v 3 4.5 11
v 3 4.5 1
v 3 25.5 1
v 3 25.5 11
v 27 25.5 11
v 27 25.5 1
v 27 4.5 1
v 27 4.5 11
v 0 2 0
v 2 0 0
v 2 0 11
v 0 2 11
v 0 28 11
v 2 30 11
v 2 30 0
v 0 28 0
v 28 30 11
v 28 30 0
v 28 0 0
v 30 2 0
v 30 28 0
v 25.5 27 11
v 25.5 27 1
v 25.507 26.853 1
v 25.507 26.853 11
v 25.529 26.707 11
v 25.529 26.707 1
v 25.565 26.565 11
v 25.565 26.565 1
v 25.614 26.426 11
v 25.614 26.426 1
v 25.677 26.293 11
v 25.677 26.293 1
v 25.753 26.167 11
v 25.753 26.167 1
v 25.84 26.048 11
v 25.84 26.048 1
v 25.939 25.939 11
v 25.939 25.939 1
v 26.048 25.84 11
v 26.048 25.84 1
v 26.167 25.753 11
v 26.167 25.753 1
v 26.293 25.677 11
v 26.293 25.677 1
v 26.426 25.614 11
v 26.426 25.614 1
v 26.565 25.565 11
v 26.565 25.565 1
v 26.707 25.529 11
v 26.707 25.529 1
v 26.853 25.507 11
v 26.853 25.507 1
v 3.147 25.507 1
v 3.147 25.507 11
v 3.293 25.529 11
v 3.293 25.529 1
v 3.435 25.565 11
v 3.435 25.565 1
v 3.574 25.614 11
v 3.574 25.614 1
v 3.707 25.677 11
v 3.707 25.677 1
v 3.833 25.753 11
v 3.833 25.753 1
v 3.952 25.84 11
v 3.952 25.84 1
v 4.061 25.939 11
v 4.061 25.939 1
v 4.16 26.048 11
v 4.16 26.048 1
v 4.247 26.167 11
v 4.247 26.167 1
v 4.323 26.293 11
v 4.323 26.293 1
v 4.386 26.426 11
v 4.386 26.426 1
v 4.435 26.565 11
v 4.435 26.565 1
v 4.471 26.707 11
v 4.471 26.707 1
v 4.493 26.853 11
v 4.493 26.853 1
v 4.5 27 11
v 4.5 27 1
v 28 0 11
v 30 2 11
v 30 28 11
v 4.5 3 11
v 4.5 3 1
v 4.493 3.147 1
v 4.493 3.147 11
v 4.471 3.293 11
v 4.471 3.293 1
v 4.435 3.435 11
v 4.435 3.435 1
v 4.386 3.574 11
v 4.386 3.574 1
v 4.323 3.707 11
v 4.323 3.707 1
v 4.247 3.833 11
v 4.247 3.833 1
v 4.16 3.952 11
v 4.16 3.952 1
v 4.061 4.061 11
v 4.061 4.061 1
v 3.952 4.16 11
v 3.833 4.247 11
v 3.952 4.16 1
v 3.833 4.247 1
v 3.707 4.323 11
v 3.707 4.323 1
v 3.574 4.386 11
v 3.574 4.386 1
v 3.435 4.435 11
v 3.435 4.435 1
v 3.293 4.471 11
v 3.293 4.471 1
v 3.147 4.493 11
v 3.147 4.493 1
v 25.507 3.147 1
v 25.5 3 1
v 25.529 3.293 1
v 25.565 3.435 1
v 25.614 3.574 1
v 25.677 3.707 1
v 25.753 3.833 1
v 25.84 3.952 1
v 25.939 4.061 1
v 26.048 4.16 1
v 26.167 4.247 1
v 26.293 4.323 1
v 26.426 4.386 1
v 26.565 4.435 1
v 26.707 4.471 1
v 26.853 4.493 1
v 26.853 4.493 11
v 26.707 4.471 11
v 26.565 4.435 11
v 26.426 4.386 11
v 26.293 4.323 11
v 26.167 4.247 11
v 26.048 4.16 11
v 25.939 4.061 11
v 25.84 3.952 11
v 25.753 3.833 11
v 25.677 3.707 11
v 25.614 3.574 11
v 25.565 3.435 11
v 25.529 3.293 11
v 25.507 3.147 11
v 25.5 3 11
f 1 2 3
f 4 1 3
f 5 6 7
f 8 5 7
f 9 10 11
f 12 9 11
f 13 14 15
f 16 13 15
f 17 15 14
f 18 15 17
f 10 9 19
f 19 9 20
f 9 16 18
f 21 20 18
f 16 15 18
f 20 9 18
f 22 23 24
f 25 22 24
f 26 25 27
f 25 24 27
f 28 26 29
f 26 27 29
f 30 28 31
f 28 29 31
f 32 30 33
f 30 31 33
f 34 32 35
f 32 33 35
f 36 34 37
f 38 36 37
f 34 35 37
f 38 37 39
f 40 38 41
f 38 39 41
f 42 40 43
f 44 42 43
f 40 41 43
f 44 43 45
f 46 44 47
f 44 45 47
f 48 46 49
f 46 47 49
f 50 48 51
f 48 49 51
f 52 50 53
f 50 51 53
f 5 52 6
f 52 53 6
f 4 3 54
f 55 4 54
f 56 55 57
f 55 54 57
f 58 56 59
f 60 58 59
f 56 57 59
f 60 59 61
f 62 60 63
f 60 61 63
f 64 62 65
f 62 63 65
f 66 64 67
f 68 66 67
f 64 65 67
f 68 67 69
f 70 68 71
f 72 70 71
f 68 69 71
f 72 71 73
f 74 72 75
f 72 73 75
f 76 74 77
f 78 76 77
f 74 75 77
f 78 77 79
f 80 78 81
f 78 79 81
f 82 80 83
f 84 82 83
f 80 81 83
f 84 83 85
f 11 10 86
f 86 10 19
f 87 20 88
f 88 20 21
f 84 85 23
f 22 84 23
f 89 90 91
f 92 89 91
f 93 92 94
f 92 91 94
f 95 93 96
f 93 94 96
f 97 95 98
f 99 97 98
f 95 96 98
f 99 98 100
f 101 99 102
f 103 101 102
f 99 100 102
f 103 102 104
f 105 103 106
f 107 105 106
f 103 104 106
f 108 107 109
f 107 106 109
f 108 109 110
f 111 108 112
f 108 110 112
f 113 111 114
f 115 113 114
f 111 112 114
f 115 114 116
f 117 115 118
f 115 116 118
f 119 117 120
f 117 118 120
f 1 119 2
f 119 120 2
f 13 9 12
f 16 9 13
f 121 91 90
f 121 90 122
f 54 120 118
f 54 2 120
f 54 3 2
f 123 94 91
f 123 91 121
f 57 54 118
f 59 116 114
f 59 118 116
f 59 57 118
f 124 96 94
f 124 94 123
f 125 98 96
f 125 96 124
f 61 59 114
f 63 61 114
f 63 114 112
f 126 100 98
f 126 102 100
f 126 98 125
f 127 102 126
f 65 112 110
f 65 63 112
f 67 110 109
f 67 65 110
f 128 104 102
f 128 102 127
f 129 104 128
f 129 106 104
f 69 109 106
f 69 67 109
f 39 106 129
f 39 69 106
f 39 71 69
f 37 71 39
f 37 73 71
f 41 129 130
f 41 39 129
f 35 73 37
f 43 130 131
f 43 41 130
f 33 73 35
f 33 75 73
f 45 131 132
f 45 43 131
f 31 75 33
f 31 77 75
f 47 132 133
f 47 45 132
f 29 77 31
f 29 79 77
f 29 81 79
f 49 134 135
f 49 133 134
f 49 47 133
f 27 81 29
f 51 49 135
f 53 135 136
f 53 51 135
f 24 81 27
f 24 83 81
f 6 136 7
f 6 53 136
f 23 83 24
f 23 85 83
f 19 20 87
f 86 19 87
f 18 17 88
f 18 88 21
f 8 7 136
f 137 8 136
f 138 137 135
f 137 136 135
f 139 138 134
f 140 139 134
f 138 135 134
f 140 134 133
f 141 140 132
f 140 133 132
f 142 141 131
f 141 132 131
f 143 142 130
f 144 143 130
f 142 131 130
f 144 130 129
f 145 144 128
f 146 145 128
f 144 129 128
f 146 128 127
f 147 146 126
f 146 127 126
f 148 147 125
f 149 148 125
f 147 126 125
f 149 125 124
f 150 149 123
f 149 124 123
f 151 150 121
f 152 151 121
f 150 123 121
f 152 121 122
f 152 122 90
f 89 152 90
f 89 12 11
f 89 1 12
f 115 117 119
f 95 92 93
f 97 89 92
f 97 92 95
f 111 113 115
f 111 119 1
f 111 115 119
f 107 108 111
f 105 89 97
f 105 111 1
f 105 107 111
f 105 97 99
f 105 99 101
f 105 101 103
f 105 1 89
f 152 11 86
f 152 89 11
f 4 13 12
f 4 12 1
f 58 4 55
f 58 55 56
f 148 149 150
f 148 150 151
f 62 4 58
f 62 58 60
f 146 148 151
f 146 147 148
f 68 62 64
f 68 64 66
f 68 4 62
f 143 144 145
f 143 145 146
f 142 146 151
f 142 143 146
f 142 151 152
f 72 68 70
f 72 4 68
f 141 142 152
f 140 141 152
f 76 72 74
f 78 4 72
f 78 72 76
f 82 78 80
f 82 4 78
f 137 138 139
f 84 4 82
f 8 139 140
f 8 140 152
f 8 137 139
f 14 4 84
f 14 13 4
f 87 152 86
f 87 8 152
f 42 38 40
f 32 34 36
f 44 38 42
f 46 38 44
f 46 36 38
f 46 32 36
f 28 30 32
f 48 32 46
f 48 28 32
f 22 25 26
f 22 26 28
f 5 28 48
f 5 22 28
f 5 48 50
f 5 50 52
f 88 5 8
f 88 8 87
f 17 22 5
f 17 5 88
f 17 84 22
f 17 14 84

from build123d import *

# Parameters (mm, degrees)
F0_W     = 30
F0_H     = 30
F1_DEPTH = 1
F2_W     = 30
F2_H     = 30
F3_DEPTH = 10
F4_SIZE  = 2


with BuildPart() as f1:
    # F0 (on Top) → F1 (new body)
    with BuildSketch(Plane.XY):
        with Locations((15, 15)):
            Rectangle(F0_W, F0_H)
    extrude(amount=F1_DEPTH)

    # F2 (on face) → F3 (join)
    with BuildSketch(Plane.XY.offset(1)):
        with Locations((15, 15)):
            Rectangle(F2_W, F2_H)
        with BuildLine():
            Line((3, 4.5), (3, 25.5))
            ThreePointArc((3, 25.5), (4.06066, 25.93934), (4.5, 27))
            Line((4.5, 27), (25.5, 27))
            ThreePointArc((25.5, 27), (25.93934, 25.93934), (27, 25.5))
            Line((27, 25.5), (27, 4.5))
            ThreePointArc((27, 4.5), (25.93934, 4.06066), (25.5, 3))
            Line((25.5, 3), (4.5, 3))
            ThreePointArc((4.5, 3), (4.06066, 4.06066), (3, 4.5))
        make_face(mode=Mode.SUBTRACT)
    extrude(amount=F3_DEPTH)

    # F4
    f4_edges = [f1.edges().sort_by_distance(p)[0] for p in [
        (30, 30, 5.5),
        (30, 0, 5.5),
        (0, 0, 5.5),
        (0, 30, 5.5),
    ]]
    chamfer(f4_edges, length=F4_SIZE)


solid = f1.part
